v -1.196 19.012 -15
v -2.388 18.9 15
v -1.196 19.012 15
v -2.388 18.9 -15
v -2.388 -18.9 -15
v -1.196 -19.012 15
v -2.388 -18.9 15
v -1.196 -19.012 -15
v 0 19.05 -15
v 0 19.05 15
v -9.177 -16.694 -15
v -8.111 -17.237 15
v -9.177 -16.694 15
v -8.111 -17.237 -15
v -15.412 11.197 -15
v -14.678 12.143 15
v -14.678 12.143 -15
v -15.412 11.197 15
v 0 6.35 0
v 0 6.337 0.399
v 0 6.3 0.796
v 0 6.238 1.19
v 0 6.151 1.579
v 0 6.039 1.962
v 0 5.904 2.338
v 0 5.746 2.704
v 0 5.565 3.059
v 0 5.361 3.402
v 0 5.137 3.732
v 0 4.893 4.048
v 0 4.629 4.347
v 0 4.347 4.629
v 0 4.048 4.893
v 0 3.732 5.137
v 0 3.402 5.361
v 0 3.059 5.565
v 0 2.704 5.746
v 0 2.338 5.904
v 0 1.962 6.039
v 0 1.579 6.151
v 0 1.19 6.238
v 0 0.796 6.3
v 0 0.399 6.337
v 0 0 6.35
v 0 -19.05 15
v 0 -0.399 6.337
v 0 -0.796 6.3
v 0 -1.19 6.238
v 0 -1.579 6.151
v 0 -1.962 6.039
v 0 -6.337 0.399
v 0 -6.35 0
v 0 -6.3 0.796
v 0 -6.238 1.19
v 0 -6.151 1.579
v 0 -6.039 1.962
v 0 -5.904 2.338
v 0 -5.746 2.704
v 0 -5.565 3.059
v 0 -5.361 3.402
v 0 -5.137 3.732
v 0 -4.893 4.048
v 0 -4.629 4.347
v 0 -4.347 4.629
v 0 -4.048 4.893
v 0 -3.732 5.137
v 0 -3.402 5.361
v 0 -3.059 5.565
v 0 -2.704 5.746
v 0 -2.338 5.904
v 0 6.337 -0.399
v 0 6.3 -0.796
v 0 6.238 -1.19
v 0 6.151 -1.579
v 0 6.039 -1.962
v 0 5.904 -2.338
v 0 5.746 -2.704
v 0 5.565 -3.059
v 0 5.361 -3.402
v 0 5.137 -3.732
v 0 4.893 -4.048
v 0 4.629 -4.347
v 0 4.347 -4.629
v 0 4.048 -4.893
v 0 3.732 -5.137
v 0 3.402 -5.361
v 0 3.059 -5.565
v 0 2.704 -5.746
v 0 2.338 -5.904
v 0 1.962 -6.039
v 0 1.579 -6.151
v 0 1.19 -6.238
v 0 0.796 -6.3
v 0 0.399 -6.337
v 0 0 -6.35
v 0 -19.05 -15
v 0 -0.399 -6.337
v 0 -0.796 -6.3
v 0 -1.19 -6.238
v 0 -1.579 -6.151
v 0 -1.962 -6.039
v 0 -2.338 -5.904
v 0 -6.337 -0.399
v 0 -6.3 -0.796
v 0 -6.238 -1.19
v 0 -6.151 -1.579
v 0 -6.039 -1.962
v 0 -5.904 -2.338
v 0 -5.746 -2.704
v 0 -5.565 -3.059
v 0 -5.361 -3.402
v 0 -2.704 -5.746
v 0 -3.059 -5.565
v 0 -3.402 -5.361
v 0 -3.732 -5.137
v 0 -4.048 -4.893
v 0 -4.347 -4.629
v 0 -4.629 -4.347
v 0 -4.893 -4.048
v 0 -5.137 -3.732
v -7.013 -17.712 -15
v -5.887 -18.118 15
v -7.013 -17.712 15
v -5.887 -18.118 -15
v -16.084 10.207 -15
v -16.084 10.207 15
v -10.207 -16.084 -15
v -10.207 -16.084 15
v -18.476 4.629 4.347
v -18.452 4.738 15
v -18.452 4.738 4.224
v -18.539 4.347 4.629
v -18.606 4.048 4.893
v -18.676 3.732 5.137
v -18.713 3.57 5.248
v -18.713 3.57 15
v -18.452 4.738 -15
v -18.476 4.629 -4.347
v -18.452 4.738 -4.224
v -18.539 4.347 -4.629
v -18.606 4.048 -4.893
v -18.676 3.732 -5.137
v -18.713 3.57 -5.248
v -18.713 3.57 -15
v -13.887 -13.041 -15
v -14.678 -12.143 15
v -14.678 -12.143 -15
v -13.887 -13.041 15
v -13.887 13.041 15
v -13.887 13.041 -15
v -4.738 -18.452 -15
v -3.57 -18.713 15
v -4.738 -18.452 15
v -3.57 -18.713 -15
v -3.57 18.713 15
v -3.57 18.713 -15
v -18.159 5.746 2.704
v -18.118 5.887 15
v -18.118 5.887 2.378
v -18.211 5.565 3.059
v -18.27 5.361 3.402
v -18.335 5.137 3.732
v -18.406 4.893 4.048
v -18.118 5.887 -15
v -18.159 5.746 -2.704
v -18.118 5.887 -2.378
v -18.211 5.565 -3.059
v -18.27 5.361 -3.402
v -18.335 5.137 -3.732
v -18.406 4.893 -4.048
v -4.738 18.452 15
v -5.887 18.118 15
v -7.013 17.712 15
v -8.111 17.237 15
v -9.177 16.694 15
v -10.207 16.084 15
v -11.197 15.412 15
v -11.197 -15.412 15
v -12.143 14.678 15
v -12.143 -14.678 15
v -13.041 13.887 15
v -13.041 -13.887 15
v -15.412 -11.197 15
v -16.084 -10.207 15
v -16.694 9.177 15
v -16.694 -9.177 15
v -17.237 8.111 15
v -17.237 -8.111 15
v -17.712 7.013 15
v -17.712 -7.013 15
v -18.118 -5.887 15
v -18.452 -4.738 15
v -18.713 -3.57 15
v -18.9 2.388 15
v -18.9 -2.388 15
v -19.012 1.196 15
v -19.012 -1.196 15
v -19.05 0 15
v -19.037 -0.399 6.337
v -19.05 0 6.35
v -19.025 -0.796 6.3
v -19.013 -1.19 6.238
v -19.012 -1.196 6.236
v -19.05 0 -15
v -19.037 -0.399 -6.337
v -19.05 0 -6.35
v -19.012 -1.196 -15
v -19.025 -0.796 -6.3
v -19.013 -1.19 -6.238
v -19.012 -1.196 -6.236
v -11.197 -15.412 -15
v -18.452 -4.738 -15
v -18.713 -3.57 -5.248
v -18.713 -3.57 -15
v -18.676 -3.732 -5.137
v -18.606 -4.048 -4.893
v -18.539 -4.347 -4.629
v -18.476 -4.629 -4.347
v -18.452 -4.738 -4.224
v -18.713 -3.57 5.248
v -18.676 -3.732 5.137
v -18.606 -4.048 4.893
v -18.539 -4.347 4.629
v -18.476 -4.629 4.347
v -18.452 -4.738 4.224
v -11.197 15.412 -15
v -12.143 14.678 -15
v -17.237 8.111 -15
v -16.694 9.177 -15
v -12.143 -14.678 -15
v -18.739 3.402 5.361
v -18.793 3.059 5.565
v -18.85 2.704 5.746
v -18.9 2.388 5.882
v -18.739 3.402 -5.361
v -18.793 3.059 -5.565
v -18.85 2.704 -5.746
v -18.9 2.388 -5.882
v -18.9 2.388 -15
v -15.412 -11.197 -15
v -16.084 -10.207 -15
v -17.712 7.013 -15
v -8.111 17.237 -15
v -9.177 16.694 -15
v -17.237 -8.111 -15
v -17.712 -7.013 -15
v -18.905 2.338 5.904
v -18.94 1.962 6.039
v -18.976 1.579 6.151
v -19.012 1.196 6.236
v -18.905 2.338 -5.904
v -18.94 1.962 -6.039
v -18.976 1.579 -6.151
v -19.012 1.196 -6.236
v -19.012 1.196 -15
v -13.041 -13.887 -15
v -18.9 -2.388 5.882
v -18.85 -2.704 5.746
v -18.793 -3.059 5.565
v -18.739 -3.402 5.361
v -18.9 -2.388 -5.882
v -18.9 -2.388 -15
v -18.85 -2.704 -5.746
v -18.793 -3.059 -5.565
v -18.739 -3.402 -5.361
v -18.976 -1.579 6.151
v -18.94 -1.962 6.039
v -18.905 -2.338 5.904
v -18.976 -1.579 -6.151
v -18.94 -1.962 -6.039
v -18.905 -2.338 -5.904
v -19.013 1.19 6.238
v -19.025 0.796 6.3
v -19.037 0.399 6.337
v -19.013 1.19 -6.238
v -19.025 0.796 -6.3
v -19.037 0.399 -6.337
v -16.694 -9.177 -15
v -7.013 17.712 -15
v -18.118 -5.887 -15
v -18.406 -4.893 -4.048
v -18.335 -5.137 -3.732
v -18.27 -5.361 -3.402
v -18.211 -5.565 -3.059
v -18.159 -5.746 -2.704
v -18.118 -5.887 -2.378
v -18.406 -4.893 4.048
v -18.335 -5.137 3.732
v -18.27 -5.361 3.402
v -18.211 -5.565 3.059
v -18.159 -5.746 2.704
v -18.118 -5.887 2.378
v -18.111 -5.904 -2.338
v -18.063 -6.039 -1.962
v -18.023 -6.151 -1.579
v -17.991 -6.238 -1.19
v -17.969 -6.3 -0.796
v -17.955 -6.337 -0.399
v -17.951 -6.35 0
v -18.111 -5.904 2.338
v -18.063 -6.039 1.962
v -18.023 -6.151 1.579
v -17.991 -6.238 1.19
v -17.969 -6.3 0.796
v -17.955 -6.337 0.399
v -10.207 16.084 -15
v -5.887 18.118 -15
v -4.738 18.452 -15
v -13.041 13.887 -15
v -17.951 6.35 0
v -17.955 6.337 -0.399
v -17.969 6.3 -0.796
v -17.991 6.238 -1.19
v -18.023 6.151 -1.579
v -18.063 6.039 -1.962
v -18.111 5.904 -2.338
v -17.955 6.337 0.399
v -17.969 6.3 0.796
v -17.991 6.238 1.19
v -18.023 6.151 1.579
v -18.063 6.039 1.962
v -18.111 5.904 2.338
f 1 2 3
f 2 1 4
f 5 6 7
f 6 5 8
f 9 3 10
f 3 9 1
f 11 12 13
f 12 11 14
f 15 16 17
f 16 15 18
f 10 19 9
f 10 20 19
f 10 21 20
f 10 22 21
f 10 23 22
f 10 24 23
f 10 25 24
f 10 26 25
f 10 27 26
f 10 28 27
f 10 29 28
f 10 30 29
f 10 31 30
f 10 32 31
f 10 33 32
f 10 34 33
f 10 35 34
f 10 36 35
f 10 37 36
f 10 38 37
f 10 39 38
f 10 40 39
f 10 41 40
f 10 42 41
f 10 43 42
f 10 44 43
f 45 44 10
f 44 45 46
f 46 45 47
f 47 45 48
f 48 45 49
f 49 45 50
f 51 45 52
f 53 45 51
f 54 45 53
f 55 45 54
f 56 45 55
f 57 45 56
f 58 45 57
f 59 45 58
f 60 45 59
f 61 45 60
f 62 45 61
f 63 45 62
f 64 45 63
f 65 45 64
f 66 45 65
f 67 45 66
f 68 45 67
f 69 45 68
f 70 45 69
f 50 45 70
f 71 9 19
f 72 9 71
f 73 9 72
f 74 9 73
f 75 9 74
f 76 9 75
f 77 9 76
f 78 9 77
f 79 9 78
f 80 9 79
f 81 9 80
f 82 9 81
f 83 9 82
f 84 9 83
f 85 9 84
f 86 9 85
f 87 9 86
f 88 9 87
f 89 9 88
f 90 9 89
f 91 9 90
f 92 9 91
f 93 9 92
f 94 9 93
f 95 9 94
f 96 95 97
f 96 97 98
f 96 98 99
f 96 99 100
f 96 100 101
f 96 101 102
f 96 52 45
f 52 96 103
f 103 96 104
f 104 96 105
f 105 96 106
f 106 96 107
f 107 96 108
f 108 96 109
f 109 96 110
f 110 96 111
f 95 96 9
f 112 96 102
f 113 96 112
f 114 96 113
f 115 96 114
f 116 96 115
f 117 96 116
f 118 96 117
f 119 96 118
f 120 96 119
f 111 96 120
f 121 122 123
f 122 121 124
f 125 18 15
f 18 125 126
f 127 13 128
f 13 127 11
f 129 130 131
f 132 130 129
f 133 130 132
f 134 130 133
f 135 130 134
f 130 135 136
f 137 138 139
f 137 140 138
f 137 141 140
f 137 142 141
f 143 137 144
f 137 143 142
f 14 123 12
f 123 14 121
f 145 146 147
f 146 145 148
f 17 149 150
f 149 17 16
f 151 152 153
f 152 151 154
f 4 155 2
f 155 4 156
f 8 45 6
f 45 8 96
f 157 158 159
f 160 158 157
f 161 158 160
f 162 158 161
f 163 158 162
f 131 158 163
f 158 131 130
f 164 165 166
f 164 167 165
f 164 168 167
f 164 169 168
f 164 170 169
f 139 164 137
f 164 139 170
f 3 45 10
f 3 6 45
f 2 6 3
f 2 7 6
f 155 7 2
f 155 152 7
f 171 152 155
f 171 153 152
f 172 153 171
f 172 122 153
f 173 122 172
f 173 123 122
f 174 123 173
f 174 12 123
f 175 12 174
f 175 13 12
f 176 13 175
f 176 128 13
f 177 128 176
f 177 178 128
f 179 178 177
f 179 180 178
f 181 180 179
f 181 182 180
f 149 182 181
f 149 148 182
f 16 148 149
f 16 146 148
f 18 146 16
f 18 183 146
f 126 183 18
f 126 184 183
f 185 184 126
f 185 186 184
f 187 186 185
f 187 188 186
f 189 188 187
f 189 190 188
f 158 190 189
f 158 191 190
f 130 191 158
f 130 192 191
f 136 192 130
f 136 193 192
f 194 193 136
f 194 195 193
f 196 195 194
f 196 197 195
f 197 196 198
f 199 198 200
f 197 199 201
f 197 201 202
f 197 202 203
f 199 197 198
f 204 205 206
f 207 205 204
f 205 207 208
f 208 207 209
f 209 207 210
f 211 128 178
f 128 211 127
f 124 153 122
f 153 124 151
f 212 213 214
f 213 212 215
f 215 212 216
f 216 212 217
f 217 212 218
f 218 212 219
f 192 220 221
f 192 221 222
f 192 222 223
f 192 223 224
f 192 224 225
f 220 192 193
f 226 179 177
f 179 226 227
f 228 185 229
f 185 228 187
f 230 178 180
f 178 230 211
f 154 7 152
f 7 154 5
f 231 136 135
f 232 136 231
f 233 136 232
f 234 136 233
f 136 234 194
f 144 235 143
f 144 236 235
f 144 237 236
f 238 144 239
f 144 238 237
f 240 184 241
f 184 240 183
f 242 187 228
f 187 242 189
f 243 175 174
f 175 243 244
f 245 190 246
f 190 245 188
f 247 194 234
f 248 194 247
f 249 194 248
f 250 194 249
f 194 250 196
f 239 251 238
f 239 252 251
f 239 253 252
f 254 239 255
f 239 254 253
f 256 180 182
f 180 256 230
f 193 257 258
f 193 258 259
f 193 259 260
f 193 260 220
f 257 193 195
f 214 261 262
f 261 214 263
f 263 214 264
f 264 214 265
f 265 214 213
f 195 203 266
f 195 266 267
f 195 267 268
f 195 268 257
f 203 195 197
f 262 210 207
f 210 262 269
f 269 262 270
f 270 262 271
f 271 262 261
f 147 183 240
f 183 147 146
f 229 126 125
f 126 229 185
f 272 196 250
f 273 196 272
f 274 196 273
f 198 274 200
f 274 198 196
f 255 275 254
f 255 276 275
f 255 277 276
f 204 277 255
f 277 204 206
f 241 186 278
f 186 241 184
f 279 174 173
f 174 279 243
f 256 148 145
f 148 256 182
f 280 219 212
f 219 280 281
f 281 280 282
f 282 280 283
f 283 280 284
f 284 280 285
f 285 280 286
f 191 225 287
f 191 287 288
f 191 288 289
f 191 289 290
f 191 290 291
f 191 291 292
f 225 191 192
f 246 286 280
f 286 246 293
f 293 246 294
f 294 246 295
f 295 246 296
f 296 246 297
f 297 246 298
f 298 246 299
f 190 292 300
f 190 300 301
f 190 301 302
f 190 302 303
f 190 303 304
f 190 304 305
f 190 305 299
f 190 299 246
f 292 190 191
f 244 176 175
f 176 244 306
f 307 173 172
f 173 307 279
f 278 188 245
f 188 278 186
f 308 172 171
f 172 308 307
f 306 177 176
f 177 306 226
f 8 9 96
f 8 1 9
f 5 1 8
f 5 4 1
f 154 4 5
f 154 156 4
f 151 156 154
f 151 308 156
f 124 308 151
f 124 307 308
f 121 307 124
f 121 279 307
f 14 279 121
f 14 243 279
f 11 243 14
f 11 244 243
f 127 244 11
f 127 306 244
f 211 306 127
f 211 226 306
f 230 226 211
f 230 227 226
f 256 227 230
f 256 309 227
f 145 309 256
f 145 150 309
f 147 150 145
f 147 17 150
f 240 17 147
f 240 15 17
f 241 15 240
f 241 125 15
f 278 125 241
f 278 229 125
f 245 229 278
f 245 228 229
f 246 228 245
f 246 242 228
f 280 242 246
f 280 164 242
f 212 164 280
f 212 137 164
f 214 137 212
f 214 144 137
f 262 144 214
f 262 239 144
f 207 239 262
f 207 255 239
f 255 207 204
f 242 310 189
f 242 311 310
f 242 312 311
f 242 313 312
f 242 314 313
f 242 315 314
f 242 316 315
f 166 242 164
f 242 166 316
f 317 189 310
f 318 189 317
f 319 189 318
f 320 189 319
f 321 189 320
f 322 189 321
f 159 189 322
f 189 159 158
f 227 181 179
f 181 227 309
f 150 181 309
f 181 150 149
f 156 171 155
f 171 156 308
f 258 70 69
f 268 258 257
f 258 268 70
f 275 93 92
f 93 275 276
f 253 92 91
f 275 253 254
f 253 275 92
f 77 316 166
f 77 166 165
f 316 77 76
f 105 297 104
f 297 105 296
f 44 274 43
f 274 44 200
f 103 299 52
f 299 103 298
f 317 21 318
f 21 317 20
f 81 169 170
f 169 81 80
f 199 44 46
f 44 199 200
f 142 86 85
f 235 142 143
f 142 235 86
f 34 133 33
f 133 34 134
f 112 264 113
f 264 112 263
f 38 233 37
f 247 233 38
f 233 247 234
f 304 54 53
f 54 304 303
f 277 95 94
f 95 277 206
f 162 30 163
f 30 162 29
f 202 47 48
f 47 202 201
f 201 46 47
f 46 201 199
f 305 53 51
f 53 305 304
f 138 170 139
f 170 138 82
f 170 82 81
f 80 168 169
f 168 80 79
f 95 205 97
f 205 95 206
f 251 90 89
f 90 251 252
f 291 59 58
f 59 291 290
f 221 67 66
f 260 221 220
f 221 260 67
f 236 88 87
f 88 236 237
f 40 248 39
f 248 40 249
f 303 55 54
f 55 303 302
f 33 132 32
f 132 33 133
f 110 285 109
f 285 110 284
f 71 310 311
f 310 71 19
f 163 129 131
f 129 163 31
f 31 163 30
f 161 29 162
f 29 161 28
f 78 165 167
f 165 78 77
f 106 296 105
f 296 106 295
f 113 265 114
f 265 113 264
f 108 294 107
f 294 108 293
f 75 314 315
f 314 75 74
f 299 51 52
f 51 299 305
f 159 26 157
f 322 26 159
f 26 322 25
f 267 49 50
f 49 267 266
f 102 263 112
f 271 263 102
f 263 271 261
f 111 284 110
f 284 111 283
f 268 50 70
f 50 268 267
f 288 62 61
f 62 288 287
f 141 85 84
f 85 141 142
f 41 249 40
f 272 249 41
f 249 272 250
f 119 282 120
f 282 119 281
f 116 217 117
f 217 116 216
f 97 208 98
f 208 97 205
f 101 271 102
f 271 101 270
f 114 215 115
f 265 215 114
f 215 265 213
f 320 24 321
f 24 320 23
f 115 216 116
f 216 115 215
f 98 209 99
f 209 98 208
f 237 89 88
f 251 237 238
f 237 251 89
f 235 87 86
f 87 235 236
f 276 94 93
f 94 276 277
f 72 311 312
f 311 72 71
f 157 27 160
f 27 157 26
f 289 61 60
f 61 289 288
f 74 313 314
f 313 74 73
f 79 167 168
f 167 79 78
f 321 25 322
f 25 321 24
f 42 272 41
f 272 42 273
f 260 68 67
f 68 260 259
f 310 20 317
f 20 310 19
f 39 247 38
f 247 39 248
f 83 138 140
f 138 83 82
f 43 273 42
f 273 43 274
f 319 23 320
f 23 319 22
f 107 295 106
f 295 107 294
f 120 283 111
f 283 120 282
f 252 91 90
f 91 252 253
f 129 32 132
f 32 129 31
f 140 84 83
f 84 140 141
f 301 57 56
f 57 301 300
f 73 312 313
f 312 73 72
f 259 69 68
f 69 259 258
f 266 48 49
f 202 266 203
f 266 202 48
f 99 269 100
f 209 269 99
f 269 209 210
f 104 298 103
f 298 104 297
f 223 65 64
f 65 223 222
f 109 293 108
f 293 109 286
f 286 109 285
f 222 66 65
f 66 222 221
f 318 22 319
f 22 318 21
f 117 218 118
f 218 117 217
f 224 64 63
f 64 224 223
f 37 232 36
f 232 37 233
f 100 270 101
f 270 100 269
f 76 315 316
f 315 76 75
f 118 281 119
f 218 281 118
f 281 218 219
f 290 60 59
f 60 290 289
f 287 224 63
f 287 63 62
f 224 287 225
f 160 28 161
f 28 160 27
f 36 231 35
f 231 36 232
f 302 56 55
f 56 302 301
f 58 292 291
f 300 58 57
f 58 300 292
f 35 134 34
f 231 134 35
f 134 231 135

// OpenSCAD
$fn=100;
diameter_of_washer=38.1; // Diameter of Half Moon
height_of_washer=30.0; // Height of Half Moon
hole_diameter=12.7; // Hole Diameter

difference(){
    linear_extrude(center=true, height=height_of_washer){
        difference(){
            circle(d=diameter_of_washer);
            translate([0,-diameter_of_washer,0]){
                square(diameter_of_washer*2);
            }
        }
    }
    rotate([0,90,0]){
        translate([0,0,-height_of_washer/2]){
            cylinder(h=height_of_washer, d1=hole_diameter, d2=hole_diameter, center=true);
        }
    }
}
